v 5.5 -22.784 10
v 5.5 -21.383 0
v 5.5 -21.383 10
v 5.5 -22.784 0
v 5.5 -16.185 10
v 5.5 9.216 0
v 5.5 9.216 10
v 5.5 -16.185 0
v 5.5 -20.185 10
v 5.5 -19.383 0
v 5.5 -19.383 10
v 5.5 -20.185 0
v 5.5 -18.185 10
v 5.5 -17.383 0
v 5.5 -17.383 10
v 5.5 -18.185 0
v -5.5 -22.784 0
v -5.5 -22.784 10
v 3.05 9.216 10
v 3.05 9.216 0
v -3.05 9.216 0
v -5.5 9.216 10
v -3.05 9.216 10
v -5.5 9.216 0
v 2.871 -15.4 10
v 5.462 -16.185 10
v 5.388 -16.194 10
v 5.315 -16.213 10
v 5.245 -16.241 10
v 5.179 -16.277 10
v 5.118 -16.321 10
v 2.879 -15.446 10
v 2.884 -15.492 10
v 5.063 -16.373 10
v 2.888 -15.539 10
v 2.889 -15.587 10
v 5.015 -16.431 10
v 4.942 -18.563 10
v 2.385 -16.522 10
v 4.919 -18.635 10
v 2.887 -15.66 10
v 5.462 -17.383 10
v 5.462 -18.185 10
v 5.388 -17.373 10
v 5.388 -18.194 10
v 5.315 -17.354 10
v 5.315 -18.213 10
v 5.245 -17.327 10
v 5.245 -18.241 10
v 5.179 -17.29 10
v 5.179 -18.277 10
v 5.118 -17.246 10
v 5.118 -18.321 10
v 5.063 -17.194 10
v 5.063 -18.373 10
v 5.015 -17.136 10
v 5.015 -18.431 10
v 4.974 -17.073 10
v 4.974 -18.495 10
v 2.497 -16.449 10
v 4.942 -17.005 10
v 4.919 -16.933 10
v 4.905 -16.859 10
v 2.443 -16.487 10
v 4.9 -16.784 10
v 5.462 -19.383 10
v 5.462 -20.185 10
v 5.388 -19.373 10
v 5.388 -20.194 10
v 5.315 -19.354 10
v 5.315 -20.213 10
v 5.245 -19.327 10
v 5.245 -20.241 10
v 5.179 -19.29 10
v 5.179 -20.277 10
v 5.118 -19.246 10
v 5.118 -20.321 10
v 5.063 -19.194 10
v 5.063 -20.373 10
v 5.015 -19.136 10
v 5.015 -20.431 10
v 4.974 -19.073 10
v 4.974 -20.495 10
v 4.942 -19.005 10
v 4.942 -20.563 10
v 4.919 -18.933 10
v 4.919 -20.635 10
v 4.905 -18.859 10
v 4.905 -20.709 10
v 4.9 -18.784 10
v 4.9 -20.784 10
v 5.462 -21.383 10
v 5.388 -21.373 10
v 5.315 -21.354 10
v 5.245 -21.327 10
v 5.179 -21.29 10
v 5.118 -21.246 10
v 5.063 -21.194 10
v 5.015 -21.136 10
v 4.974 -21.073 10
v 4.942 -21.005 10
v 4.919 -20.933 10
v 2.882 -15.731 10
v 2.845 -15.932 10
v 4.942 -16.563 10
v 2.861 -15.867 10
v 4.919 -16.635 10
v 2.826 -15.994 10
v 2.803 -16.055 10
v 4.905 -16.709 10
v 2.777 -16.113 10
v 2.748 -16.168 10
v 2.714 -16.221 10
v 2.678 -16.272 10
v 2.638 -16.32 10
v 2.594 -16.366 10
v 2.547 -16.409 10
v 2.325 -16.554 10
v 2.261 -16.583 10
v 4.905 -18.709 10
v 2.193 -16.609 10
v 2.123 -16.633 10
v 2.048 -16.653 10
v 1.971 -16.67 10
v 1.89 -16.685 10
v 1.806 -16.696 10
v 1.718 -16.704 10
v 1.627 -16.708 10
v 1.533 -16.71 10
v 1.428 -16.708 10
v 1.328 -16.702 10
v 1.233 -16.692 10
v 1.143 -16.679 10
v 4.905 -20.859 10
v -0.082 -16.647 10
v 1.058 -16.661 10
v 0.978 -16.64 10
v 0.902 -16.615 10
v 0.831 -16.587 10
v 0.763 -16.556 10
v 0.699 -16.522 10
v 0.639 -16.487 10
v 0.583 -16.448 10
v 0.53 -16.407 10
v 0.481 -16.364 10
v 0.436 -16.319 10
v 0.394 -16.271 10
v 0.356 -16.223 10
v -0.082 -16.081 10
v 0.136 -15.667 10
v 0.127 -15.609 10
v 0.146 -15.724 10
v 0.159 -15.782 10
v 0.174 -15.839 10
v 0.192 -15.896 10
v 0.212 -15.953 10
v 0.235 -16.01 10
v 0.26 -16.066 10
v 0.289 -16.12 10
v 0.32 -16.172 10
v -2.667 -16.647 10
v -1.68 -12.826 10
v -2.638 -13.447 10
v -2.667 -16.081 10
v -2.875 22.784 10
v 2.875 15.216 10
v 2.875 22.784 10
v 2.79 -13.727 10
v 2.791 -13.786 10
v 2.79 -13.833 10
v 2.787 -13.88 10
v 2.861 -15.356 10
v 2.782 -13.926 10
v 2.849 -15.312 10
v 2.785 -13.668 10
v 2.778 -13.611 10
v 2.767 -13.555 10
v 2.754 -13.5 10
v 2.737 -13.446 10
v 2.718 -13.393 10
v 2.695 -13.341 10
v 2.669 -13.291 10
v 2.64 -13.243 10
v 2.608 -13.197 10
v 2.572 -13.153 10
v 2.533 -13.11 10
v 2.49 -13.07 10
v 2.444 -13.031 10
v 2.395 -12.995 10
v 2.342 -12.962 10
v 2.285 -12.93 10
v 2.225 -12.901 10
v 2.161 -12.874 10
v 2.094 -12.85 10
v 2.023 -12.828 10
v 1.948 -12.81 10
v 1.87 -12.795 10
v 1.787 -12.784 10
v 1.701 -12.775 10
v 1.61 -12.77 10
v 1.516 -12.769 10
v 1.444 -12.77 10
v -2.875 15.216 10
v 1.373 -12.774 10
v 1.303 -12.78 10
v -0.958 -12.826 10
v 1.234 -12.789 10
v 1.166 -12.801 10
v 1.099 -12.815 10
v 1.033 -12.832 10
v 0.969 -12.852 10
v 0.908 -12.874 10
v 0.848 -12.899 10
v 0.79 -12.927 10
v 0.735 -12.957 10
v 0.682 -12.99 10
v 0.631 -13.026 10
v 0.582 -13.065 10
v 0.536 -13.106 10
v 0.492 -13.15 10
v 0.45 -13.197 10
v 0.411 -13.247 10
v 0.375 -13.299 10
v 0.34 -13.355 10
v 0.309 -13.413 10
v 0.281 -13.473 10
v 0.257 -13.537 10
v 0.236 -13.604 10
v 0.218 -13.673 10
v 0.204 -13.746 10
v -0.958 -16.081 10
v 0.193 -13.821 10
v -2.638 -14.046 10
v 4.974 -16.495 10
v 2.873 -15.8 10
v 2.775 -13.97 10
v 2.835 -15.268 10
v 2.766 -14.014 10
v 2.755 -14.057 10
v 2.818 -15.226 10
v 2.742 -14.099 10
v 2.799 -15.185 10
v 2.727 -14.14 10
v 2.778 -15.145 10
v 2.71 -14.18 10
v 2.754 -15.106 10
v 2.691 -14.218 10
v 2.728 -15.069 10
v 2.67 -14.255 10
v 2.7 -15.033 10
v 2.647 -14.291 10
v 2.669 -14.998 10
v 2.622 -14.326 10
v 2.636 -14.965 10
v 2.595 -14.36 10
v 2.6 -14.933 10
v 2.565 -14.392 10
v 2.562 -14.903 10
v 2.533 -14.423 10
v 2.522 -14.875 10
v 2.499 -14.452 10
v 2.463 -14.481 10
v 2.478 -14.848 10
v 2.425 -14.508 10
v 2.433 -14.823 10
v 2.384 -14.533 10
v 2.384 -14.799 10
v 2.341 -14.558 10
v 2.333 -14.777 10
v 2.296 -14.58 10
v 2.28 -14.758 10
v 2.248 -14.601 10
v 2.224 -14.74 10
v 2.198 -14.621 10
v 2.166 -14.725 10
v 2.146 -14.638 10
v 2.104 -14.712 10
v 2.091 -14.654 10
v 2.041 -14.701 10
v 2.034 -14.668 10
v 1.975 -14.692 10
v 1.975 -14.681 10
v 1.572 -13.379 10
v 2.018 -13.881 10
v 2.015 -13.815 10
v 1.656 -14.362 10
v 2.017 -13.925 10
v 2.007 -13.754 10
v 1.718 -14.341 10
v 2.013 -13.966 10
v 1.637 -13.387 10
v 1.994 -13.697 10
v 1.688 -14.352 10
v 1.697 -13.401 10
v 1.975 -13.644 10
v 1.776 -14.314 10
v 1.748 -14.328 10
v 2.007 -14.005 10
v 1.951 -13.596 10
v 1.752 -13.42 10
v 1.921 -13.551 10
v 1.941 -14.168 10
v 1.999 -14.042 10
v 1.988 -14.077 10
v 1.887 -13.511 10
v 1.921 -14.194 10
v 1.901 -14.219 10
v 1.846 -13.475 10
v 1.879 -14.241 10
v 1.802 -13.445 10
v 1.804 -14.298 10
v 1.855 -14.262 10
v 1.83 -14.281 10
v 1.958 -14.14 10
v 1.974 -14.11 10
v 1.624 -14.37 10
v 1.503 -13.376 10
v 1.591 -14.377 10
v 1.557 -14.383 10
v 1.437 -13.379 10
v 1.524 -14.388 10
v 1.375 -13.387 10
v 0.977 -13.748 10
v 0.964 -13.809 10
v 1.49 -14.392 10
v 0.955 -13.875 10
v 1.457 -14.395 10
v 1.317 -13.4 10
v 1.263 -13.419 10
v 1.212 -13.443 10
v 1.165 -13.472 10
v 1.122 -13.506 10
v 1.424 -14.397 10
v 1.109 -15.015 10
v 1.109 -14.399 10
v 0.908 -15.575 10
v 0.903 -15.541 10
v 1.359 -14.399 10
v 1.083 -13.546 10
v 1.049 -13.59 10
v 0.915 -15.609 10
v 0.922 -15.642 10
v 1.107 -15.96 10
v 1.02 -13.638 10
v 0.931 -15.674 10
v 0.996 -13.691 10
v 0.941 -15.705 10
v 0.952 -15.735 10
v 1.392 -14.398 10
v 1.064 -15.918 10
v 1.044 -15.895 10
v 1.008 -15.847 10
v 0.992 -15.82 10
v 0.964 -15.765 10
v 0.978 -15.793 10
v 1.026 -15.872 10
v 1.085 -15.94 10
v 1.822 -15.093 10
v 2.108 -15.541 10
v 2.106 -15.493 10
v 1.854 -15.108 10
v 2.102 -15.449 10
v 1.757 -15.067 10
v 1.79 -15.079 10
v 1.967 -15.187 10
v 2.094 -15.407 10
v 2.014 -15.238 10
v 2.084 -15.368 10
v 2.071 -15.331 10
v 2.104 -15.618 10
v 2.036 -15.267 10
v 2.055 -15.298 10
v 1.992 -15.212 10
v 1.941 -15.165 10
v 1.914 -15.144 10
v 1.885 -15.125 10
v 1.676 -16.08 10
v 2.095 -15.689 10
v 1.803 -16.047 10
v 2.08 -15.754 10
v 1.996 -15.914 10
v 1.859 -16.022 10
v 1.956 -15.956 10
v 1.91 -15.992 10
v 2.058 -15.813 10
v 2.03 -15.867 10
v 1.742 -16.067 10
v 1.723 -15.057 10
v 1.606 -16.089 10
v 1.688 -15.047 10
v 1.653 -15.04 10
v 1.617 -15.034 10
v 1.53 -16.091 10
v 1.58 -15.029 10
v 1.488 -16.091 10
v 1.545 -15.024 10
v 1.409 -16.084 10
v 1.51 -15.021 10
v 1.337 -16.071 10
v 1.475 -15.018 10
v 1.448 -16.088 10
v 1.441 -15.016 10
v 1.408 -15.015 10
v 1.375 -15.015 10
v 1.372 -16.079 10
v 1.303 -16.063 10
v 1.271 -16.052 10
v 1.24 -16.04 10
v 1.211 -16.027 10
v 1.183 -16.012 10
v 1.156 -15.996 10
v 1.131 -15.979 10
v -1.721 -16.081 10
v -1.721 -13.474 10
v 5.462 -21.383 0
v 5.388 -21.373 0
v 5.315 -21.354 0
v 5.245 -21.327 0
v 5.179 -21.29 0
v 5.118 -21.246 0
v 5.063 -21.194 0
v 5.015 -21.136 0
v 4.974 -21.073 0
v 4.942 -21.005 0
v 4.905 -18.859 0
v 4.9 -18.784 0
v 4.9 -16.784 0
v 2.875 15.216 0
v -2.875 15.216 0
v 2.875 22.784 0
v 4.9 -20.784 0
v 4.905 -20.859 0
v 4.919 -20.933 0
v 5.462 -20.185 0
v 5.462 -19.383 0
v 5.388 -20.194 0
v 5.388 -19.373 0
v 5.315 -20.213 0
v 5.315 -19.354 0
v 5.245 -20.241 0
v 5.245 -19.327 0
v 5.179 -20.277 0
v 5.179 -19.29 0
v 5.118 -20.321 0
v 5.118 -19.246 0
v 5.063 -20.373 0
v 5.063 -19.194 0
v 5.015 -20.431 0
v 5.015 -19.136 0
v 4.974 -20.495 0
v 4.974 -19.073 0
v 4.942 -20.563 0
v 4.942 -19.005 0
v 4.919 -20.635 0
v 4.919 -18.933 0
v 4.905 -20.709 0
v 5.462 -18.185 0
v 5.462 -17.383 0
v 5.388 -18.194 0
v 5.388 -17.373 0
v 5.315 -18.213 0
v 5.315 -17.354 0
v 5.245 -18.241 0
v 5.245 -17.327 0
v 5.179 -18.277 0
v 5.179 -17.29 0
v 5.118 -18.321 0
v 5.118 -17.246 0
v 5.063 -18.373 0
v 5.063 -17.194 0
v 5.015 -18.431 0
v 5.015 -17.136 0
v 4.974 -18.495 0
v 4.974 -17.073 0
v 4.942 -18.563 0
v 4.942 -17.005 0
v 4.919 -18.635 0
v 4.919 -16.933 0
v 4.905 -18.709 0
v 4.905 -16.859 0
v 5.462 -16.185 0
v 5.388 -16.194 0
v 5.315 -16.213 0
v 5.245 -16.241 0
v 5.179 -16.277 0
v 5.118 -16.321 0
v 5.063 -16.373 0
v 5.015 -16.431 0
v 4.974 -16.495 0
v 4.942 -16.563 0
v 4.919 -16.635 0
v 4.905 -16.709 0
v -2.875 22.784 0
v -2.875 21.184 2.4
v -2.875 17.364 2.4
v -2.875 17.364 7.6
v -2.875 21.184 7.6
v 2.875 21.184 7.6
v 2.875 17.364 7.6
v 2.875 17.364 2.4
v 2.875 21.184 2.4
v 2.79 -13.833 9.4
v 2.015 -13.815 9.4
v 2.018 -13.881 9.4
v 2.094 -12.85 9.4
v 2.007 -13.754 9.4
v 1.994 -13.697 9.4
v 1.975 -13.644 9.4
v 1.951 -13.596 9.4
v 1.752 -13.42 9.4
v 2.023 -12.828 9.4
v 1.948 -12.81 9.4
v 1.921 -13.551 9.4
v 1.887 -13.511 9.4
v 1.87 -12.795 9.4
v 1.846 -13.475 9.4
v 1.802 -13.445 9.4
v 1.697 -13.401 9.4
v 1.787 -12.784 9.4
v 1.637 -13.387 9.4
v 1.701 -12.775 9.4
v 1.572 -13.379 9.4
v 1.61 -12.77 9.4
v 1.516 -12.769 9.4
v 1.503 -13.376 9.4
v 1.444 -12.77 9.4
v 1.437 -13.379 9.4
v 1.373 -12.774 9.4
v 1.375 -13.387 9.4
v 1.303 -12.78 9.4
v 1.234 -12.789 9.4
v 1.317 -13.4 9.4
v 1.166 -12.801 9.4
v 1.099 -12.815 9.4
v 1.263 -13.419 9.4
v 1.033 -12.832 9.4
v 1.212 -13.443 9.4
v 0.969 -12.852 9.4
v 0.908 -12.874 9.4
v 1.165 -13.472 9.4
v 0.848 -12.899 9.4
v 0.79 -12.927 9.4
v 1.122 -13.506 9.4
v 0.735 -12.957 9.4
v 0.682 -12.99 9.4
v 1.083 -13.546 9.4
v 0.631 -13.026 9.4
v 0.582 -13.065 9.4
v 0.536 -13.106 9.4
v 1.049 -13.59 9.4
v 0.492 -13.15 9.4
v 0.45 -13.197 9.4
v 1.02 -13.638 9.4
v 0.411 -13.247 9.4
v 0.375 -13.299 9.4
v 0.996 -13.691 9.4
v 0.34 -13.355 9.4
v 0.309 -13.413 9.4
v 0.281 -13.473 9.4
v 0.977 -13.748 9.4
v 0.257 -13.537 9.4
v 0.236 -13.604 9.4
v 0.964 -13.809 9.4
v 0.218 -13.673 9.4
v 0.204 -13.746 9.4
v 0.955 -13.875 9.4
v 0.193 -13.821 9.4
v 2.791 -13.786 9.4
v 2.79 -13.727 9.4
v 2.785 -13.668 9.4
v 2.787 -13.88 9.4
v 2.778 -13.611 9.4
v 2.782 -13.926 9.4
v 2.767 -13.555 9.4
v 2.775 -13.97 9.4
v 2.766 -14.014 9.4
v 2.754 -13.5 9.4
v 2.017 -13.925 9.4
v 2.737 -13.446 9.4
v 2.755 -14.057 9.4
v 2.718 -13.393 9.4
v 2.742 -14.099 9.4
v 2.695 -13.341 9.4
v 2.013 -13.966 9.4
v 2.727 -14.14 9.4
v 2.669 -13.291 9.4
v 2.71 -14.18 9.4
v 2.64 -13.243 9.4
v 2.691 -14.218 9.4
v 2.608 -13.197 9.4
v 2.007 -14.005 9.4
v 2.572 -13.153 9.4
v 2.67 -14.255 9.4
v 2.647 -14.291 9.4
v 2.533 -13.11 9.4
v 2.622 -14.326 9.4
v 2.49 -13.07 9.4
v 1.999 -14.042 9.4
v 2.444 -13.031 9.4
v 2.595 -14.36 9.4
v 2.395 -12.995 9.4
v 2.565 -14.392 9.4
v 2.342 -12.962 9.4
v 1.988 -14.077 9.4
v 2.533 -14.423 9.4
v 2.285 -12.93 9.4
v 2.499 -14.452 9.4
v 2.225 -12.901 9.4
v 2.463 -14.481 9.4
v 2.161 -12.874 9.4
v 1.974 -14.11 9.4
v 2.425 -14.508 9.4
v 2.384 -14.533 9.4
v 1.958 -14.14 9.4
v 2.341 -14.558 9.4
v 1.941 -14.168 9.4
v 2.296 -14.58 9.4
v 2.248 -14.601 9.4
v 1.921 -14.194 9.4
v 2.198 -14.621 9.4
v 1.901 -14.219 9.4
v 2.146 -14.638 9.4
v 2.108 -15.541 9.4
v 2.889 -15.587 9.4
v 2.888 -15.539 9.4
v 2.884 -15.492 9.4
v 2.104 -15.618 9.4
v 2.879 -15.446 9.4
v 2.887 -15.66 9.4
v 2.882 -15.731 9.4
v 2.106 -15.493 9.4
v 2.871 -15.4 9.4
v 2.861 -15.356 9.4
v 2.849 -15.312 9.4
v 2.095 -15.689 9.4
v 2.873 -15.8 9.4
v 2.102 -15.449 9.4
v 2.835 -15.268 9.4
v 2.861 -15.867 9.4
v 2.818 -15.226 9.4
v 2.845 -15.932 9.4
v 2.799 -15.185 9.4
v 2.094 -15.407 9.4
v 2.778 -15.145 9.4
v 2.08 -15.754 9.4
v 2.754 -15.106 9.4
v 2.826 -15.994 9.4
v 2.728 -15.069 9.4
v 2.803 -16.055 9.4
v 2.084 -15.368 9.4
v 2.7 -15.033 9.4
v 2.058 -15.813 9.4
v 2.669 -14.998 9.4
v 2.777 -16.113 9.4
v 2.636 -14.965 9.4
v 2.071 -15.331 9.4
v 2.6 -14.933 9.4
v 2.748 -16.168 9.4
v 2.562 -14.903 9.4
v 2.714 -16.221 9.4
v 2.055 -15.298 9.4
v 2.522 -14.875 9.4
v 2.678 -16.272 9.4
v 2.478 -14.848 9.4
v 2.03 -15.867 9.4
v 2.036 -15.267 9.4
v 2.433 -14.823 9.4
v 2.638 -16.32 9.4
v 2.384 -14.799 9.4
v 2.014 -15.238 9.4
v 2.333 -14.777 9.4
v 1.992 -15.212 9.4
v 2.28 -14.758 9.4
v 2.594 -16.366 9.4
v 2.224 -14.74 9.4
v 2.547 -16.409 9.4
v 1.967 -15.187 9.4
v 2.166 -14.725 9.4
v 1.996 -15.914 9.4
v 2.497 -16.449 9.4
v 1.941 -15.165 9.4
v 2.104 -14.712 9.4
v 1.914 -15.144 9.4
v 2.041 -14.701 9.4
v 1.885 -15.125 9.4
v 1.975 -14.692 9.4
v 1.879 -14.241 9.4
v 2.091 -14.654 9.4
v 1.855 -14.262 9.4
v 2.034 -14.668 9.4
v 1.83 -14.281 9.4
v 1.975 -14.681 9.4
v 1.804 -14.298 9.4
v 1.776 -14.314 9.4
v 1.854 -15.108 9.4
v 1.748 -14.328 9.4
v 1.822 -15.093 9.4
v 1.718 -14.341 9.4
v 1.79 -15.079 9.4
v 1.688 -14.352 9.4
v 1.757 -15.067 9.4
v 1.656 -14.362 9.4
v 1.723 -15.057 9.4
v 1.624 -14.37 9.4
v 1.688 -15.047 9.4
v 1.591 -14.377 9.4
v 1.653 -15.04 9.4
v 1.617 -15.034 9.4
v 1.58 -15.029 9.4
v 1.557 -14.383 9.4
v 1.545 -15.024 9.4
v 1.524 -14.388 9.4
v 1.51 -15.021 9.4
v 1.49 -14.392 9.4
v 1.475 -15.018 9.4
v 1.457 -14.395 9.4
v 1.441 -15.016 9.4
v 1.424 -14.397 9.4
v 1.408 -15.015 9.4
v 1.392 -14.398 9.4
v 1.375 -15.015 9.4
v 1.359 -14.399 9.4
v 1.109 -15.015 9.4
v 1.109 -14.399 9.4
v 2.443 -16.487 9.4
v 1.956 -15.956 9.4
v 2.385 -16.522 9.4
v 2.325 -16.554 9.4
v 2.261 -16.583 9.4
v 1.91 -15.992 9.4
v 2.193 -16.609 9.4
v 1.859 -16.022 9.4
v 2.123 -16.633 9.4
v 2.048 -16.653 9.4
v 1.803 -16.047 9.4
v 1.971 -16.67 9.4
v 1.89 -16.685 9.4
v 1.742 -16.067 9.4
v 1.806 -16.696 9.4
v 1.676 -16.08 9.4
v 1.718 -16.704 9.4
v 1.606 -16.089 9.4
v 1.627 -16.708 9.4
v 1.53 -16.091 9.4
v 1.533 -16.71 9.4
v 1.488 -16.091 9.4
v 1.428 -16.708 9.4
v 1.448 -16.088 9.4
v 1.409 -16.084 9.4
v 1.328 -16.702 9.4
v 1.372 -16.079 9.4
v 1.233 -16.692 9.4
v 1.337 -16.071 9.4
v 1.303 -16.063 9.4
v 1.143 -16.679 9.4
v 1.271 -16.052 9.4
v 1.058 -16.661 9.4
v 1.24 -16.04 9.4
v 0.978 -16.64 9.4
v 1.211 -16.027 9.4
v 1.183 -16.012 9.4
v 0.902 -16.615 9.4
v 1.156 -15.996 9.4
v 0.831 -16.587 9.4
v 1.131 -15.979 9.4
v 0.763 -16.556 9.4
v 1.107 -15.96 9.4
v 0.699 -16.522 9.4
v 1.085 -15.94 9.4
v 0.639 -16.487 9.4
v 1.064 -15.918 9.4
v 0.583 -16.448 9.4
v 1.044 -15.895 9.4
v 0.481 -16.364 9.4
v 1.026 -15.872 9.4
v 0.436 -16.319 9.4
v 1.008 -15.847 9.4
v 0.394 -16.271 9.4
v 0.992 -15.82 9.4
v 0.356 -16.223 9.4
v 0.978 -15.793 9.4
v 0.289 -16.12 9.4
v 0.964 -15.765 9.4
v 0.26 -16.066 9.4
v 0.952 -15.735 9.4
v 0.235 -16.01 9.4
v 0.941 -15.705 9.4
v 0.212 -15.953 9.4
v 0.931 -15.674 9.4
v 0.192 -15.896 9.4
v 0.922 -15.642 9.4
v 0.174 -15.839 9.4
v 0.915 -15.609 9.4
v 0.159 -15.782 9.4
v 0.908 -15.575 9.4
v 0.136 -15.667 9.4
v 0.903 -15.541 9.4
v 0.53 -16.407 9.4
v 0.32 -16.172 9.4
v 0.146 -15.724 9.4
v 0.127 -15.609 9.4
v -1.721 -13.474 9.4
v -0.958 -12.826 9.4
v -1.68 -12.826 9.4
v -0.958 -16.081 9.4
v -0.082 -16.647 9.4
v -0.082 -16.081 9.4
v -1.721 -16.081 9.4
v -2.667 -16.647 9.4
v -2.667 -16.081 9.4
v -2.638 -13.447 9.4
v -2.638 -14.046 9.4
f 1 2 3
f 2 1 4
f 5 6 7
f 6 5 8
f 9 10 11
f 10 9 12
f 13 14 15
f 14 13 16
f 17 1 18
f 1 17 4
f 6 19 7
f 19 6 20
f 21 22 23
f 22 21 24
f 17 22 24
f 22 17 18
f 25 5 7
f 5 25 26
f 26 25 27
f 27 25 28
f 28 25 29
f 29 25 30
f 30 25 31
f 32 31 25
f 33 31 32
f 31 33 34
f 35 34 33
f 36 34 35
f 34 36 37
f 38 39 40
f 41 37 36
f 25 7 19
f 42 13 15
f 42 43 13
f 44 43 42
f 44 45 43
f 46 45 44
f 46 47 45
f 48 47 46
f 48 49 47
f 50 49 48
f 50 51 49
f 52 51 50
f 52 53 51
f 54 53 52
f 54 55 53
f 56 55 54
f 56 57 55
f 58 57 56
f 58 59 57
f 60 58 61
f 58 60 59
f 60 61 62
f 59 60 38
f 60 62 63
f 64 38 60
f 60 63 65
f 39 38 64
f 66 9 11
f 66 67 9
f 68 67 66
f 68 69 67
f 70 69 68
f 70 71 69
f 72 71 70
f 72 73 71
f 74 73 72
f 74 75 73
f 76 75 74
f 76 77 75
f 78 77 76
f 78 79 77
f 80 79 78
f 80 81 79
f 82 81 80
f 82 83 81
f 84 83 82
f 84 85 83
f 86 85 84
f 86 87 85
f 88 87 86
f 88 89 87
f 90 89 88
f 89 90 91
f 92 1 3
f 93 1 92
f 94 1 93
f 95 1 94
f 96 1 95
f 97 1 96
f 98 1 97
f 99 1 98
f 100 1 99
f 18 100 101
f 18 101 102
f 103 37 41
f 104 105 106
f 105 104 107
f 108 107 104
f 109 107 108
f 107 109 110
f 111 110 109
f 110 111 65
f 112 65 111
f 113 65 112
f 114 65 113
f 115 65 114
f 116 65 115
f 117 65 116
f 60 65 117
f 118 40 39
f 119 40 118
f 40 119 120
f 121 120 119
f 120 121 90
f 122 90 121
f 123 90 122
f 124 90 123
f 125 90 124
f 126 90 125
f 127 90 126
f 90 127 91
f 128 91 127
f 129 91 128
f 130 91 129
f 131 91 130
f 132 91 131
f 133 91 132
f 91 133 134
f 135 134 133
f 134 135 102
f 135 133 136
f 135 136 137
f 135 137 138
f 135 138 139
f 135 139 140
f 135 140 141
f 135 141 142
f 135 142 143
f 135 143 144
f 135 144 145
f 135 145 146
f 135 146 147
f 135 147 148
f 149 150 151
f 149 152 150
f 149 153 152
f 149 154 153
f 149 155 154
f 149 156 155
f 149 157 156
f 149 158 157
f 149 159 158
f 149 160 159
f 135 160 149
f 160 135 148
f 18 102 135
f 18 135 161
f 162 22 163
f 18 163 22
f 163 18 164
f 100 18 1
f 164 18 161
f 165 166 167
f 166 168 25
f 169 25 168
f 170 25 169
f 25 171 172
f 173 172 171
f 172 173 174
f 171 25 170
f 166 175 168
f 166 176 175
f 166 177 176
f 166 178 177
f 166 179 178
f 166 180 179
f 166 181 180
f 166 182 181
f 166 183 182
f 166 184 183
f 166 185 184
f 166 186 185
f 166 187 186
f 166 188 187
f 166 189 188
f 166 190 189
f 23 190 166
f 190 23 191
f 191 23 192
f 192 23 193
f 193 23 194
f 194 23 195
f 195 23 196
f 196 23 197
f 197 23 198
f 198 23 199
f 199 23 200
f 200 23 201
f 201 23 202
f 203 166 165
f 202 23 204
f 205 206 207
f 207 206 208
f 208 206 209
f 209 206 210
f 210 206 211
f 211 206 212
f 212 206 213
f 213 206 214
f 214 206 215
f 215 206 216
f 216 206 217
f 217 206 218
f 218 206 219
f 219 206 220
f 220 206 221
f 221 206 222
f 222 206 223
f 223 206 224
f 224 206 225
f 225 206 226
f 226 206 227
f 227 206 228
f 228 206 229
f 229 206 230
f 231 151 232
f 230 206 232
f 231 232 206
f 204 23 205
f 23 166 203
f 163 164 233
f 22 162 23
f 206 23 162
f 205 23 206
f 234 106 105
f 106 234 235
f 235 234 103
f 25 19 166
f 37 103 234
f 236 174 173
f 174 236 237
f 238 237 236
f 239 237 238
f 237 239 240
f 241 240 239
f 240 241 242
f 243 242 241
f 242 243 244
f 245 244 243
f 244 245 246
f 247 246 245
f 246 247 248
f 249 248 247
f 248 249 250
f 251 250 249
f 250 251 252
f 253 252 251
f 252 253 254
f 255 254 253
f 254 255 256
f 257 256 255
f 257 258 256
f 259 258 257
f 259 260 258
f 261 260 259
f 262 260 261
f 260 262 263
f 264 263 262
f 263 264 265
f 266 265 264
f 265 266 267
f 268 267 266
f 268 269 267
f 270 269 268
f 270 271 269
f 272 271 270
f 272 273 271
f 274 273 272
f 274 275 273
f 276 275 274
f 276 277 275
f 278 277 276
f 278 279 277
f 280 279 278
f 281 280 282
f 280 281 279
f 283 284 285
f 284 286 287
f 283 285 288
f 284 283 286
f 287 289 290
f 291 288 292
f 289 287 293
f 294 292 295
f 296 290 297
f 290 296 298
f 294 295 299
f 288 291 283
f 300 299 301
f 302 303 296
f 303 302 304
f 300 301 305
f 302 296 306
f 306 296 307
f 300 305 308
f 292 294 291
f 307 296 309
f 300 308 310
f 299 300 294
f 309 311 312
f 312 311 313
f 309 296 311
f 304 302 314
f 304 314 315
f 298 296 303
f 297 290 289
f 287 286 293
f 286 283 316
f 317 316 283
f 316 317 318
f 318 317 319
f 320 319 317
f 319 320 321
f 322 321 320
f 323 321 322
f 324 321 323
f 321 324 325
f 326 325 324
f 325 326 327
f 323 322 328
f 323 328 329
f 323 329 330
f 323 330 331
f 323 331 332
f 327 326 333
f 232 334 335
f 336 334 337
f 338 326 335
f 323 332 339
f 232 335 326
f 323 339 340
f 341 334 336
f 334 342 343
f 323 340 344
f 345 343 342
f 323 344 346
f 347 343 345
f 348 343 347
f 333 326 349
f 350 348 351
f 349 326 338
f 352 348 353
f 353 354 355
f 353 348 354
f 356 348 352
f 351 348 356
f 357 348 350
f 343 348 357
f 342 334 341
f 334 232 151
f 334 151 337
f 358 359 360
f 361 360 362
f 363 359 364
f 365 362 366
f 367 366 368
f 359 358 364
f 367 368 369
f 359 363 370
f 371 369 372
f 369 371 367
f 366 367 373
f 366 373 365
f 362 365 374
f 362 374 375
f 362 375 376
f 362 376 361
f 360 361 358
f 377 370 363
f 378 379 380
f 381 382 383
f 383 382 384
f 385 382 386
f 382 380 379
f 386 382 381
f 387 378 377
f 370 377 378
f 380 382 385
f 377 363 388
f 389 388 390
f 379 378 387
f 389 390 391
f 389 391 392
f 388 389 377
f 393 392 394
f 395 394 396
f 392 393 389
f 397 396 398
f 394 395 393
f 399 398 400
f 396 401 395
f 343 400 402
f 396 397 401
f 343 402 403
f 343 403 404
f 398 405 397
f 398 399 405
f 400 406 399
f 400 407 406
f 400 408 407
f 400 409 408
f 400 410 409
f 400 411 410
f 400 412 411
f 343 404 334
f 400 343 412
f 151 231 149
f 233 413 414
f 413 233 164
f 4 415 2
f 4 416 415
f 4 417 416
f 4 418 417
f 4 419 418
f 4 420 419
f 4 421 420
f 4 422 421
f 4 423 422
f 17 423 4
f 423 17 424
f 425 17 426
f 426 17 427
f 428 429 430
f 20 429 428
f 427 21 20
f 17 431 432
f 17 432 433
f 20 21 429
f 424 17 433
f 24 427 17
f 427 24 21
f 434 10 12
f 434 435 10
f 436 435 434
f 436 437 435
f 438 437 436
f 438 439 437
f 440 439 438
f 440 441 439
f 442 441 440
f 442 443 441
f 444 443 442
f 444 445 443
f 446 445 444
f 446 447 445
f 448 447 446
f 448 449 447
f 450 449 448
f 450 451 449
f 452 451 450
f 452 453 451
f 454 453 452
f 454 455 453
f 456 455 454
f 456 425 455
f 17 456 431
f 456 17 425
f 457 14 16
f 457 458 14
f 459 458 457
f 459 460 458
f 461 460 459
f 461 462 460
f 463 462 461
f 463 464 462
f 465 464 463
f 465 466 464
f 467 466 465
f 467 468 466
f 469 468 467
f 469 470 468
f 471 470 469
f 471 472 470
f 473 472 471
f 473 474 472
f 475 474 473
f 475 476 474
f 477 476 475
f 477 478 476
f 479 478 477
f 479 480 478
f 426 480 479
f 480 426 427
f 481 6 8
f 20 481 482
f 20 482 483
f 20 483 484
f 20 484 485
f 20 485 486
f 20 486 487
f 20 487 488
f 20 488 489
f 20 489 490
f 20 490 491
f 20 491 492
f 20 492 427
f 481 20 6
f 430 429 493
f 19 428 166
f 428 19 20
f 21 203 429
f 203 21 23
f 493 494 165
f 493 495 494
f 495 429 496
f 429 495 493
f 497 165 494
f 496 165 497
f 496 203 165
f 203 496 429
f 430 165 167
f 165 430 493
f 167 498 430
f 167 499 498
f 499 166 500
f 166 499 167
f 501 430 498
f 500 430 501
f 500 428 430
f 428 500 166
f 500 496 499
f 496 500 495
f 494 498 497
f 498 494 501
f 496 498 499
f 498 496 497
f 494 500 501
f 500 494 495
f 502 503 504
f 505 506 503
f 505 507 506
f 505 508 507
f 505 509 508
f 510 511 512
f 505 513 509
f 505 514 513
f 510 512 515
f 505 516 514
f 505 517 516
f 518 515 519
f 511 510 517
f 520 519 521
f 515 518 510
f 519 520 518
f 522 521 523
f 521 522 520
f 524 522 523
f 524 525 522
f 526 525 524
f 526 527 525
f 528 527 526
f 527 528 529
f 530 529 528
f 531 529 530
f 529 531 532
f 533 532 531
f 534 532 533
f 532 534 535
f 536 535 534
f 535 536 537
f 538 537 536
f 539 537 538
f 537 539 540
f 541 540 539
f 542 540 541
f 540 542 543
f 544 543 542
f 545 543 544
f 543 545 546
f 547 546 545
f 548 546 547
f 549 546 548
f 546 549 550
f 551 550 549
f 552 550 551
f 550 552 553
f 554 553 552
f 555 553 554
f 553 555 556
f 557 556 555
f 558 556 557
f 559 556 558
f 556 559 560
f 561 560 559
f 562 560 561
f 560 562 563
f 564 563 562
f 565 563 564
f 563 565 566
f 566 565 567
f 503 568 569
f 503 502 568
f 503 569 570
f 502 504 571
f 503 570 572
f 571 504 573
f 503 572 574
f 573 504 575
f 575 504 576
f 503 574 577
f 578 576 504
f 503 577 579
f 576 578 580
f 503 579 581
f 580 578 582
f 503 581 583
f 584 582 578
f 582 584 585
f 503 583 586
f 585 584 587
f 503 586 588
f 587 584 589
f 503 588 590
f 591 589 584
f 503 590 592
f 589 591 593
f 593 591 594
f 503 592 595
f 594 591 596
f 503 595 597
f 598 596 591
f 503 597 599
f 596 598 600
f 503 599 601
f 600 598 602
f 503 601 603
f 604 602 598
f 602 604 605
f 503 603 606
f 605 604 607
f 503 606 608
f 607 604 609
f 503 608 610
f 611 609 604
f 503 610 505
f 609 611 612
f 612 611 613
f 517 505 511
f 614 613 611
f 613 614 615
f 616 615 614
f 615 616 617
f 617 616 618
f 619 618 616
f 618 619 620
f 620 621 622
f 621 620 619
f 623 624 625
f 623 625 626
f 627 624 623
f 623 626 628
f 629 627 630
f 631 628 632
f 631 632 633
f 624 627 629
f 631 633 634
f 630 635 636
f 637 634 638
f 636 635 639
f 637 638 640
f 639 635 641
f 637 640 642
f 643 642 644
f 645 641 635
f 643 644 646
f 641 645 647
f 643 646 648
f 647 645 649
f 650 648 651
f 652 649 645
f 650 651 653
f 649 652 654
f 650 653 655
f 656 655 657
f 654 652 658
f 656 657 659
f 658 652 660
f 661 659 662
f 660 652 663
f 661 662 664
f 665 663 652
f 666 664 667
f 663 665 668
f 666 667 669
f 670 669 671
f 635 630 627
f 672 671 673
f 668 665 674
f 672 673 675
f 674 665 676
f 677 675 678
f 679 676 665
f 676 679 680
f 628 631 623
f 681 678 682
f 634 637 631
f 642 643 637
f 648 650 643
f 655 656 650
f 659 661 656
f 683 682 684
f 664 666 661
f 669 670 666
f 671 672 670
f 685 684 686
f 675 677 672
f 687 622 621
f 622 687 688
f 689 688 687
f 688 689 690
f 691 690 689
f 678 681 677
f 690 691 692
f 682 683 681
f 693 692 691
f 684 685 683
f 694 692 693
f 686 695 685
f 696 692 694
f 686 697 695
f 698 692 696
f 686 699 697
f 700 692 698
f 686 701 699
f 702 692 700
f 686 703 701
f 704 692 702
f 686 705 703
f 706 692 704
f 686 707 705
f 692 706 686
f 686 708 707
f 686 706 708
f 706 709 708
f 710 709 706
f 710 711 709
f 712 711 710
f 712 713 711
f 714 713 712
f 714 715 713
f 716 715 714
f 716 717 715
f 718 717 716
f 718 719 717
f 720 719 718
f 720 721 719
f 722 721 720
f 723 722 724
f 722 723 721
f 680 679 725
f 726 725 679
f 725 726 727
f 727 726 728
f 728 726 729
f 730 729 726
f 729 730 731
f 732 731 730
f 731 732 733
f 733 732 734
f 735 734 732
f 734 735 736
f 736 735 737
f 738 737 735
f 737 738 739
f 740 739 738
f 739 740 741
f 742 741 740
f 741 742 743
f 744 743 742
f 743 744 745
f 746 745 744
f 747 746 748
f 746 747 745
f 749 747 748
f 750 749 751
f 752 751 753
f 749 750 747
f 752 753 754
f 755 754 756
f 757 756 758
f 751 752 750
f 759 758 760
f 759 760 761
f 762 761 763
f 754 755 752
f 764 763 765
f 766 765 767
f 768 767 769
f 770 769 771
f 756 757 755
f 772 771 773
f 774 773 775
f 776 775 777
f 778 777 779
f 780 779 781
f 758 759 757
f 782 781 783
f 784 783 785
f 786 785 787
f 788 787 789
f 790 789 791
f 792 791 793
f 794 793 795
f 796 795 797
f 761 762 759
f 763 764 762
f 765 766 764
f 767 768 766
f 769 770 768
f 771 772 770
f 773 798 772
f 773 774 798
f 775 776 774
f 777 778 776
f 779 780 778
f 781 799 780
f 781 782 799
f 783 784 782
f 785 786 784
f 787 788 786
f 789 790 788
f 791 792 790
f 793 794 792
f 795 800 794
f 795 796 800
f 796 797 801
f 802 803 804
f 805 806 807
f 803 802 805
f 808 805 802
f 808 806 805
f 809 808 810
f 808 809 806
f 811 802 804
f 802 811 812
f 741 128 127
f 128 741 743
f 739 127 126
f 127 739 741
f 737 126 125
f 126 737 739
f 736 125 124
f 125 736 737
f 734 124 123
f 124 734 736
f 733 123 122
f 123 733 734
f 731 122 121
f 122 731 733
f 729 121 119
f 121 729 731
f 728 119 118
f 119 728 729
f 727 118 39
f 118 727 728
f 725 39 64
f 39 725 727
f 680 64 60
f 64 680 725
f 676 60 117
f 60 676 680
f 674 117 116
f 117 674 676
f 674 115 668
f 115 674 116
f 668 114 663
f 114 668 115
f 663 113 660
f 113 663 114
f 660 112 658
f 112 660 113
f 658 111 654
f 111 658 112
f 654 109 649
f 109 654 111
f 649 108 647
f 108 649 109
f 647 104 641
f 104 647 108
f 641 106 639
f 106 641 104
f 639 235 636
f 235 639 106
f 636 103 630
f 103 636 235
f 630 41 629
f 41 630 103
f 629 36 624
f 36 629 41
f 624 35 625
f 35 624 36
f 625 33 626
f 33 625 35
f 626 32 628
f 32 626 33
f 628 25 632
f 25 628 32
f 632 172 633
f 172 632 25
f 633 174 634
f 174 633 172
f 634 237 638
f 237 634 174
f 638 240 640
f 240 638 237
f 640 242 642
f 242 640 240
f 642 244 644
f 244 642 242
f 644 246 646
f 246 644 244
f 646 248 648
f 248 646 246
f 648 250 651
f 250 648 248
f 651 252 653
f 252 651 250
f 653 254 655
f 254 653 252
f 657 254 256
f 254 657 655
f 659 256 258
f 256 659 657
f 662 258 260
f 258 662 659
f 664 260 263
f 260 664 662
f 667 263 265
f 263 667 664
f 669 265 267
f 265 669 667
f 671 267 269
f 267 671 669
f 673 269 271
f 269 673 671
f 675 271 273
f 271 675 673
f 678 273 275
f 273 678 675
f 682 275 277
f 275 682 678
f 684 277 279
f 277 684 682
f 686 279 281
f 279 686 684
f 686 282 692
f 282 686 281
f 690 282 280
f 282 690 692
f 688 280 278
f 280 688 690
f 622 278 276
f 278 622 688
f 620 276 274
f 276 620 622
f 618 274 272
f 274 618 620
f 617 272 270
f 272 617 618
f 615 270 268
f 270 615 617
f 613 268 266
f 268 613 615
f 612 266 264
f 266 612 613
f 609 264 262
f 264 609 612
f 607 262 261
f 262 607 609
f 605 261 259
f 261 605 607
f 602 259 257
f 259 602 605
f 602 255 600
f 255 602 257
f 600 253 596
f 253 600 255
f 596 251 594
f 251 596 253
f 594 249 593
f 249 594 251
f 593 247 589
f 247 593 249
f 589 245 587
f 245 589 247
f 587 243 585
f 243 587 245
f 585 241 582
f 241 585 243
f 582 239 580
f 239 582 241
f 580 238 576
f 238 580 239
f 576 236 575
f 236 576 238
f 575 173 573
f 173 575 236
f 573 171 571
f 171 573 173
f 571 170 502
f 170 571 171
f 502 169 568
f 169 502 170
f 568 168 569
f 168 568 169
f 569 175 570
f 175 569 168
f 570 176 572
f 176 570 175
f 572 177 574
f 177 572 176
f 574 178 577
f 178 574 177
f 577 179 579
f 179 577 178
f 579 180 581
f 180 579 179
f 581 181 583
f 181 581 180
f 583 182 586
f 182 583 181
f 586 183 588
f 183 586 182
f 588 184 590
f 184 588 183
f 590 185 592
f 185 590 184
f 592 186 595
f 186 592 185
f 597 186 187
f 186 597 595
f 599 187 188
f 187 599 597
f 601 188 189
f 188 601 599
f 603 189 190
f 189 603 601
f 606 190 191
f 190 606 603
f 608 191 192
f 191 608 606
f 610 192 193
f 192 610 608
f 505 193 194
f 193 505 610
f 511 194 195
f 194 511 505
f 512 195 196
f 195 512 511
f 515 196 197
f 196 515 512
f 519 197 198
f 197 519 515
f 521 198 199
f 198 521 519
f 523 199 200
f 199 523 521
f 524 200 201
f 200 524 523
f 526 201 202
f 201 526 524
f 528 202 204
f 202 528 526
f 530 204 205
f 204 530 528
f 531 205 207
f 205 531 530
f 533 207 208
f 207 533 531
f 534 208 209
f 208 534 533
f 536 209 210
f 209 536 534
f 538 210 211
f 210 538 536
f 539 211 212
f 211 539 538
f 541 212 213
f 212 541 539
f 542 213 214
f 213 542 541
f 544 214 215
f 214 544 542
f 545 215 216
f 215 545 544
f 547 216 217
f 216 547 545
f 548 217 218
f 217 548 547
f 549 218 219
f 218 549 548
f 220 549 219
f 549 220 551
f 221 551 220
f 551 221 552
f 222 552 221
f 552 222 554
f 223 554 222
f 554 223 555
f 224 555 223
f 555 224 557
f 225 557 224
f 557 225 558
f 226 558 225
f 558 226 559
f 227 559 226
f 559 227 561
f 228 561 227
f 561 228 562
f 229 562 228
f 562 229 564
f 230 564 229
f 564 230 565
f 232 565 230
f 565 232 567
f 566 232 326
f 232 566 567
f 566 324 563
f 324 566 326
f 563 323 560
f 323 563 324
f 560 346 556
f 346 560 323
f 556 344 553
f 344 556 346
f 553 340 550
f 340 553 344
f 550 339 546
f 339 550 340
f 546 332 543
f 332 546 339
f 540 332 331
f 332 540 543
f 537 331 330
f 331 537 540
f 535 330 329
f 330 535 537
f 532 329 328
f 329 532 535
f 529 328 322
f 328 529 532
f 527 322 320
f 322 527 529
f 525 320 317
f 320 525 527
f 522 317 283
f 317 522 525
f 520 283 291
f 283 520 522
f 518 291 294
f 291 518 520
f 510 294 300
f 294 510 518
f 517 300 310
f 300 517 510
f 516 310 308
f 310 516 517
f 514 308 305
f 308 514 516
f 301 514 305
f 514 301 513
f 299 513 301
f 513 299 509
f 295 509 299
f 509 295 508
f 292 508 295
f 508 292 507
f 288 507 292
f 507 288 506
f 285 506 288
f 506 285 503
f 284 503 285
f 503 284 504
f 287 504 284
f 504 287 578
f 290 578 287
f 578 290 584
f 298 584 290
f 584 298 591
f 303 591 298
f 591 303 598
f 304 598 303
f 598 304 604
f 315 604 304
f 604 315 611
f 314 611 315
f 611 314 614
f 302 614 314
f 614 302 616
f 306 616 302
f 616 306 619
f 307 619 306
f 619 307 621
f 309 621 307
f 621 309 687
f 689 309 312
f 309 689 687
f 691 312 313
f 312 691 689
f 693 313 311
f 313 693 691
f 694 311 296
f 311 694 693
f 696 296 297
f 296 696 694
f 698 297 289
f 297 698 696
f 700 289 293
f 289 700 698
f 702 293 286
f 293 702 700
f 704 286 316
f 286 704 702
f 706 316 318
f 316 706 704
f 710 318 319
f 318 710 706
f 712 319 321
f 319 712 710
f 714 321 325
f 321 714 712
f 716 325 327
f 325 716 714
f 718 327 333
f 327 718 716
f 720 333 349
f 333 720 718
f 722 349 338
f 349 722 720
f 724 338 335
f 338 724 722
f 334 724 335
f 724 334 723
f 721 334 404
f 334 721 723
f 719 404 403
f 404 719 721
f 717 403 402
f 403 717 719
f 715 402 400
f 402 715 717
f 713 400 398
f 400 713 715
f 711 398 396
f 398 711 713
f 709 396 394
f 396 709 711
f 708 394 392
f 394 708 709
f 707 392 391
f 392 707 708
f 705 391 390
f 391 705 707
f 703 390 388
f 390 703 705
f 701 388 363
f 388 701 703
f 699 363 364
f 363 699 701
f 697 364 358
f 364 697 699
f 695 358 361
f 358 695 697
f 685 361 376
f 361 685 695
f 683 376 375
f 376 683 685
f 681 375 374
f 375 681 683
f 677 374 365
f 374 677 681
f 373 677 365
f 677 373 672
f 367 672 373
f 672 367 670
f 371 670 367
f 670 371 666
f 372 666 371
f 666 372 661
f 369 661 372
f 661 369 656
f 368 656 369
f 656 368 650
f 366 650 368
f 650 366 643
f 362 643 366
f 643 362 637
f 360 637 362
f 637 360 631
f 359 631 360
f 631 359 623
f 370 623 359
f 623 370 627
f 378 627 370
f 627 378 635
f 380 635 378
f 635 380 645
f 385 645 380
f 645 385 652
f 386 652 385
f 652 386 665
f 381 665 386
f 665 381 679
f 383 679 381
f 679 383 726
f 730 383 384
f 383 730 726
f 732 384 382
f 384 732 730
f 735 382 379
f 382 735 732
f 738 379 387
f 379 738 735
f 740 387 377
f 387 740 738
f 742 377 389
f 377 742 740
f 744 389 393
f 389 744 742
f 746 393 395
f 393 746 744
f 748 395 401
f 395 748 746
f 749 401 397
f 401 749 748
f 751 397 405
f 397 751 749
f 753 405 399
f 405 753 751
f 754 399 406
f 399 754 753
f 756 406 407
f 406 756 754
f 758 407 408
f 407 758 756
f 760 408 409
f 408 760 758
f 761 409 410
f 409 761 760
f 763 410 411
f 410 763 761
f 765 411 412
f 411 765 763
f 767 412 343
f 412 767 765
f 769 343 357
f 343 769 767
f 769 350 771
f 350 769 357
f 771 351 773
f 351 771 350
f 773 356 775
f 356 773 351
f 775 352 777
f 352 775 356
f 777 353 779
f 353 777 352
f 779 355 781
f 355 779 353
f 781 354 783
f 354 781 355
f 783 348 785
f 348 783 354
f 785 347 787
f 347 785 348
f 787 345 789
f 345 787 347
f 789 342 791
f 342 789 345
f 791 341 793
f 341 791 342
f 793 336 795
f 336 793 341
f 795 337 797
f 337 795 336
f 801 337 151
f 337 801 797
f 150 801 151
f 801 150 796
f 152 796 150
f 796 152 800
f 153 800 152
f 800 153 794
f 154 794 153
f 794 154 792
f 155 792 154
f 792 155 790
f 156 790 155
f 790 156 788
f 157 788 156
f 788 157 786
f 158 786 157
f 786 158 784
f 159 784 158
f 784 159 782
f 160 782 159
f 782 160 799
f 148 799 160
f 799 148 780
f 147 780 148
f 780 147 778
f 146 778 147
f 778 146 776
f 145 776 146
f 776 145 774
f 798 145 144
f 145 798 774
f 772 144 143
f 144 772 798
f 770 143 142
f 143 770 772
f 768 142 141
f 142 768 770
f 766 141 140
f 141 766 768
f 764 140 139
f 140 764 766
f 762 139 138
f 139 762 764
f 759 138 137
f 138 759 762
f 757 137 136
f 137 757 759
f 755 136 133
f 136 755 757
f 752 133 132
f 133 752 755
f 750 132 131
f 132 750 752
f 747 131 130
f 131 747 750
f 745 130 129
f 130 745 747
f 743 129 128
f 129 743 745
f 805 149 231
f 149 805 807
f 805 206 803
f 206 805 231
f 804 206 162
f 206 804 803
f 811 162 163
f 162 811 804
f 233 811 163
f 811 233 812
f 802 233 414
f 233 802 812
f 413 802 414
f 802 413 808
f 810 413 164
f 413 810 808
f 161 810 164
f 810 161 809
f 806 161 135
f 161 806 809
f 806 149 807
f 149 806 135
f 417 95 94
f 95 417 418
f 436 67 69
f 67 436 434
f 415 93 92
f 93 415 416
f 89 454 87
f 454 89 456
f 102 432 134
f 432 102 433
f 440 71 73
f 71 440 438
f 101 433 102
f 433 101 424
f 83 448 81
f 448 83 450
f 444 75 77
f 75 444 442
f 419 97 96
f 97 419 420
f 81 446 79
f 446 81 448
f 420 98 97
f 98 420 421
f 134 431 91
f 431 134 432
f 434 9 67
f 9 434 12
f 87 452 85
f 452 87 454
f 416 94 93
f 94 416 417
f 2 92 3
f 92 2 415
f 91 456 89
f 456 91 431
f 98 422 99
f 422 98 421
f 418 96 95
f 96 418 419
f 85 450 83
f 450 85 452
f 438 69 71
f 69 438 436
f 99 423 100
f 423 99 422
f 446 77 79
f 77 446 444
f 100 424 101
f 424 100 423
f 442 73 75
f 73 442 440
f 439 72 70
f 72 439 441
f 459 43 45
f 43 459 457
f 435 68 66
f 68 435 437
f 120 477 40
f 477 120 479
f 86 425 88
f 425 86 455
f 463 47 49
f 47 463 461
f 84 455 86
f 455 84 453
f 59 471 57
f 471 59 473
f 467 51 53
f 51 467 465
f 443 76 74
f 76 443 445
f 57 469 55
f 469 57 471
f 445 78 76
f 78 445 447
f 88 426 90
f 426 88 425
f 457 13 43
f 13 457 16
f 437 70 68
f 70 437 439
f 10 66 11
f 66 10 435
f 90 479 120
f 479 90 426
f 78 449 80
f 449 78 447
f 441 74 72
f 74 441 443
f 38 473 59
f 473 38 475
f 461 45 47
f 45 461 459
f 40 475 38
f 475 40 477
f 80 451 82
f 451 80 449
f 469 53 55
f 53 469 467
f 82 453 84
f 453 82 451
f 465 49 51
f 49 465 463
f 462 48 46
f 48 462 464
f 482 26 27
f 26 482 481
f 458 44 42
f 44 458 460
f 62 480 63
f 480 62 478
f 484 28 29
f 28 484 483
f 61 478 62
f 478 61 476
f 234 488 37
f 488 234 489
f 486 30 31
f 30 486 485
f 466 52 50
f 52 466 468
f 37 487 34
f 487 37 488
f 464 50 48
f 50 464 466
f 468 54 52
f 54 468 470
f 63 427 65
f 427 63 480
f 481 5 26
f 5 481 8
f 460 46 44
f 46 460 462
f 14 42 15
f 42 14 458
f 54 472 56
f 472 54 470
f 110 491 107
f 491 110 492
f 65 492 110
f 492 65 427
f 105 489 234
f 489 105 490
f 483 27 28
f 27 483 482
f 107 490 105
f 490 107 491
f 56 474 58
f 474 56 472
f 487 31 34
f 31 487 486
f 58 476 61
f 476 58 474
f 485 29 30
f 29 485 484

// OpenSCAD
$fn = 50;

difference() {
	union() {
		translate(v = [0, 9.21625, 0]) {
			rotate(a = [90, 0, 0]) {
				difference() {
					union() {
						translate(v = [-5.5, 0, 0]) {
							cube(size = [11.0, 10.0, 32.0]);
						}
						translate(v = [0, 10.0, 0]) {
							rotate(a = [90, 0, 0]) {
								linear_extrude(height = 10.0) {
									polygon(points = [[-2.875, -13.5675], [2.875, -13.5675], [2.875, -6.0], [3.05, 0], [3.05, 0.1], [-3.05, 0.1], [-3.05, 0], [-2.875, -6.0]]);
								}
							}
						}
					}
					union() {
						translate(v = [-2.975, 2.4000000000000004, -11.9675]) {
							cube(size = [5.95, 5.199999999999999, 3.8200000000000003]);
						}
						translate(v = [0, 9.4, 24.0]) {
							rotate(a = [-90, 0, 0]) {
								linear_extrude(height = 0.7) {
									text(font = "Arial:style=Bold", halign = "center", size = 4.0, text = "13", valign = "center");
								}
							}
						}
						translate(v = [5.5, 10.1, 30.0]) {
							rotate(a = [90, 0, 0]) {
								cylinder(h = 10.2, r = 0.6);
							}
						}
						translate(v = [5.5, 10.1, 28.0]) {
							rotate(a = [90, 0, 0]) {
								cylinder(h = 10.2, r = 0.6);
							}
						}
						translate(v = [5.5, 10.1, 26.0]) {
							rotate(a = [90, 0, 0]) {
								cylinder(h = 10.2, r = 0.6);
							}
						}
					}
				}
			}
		}
	}
	union();
}
